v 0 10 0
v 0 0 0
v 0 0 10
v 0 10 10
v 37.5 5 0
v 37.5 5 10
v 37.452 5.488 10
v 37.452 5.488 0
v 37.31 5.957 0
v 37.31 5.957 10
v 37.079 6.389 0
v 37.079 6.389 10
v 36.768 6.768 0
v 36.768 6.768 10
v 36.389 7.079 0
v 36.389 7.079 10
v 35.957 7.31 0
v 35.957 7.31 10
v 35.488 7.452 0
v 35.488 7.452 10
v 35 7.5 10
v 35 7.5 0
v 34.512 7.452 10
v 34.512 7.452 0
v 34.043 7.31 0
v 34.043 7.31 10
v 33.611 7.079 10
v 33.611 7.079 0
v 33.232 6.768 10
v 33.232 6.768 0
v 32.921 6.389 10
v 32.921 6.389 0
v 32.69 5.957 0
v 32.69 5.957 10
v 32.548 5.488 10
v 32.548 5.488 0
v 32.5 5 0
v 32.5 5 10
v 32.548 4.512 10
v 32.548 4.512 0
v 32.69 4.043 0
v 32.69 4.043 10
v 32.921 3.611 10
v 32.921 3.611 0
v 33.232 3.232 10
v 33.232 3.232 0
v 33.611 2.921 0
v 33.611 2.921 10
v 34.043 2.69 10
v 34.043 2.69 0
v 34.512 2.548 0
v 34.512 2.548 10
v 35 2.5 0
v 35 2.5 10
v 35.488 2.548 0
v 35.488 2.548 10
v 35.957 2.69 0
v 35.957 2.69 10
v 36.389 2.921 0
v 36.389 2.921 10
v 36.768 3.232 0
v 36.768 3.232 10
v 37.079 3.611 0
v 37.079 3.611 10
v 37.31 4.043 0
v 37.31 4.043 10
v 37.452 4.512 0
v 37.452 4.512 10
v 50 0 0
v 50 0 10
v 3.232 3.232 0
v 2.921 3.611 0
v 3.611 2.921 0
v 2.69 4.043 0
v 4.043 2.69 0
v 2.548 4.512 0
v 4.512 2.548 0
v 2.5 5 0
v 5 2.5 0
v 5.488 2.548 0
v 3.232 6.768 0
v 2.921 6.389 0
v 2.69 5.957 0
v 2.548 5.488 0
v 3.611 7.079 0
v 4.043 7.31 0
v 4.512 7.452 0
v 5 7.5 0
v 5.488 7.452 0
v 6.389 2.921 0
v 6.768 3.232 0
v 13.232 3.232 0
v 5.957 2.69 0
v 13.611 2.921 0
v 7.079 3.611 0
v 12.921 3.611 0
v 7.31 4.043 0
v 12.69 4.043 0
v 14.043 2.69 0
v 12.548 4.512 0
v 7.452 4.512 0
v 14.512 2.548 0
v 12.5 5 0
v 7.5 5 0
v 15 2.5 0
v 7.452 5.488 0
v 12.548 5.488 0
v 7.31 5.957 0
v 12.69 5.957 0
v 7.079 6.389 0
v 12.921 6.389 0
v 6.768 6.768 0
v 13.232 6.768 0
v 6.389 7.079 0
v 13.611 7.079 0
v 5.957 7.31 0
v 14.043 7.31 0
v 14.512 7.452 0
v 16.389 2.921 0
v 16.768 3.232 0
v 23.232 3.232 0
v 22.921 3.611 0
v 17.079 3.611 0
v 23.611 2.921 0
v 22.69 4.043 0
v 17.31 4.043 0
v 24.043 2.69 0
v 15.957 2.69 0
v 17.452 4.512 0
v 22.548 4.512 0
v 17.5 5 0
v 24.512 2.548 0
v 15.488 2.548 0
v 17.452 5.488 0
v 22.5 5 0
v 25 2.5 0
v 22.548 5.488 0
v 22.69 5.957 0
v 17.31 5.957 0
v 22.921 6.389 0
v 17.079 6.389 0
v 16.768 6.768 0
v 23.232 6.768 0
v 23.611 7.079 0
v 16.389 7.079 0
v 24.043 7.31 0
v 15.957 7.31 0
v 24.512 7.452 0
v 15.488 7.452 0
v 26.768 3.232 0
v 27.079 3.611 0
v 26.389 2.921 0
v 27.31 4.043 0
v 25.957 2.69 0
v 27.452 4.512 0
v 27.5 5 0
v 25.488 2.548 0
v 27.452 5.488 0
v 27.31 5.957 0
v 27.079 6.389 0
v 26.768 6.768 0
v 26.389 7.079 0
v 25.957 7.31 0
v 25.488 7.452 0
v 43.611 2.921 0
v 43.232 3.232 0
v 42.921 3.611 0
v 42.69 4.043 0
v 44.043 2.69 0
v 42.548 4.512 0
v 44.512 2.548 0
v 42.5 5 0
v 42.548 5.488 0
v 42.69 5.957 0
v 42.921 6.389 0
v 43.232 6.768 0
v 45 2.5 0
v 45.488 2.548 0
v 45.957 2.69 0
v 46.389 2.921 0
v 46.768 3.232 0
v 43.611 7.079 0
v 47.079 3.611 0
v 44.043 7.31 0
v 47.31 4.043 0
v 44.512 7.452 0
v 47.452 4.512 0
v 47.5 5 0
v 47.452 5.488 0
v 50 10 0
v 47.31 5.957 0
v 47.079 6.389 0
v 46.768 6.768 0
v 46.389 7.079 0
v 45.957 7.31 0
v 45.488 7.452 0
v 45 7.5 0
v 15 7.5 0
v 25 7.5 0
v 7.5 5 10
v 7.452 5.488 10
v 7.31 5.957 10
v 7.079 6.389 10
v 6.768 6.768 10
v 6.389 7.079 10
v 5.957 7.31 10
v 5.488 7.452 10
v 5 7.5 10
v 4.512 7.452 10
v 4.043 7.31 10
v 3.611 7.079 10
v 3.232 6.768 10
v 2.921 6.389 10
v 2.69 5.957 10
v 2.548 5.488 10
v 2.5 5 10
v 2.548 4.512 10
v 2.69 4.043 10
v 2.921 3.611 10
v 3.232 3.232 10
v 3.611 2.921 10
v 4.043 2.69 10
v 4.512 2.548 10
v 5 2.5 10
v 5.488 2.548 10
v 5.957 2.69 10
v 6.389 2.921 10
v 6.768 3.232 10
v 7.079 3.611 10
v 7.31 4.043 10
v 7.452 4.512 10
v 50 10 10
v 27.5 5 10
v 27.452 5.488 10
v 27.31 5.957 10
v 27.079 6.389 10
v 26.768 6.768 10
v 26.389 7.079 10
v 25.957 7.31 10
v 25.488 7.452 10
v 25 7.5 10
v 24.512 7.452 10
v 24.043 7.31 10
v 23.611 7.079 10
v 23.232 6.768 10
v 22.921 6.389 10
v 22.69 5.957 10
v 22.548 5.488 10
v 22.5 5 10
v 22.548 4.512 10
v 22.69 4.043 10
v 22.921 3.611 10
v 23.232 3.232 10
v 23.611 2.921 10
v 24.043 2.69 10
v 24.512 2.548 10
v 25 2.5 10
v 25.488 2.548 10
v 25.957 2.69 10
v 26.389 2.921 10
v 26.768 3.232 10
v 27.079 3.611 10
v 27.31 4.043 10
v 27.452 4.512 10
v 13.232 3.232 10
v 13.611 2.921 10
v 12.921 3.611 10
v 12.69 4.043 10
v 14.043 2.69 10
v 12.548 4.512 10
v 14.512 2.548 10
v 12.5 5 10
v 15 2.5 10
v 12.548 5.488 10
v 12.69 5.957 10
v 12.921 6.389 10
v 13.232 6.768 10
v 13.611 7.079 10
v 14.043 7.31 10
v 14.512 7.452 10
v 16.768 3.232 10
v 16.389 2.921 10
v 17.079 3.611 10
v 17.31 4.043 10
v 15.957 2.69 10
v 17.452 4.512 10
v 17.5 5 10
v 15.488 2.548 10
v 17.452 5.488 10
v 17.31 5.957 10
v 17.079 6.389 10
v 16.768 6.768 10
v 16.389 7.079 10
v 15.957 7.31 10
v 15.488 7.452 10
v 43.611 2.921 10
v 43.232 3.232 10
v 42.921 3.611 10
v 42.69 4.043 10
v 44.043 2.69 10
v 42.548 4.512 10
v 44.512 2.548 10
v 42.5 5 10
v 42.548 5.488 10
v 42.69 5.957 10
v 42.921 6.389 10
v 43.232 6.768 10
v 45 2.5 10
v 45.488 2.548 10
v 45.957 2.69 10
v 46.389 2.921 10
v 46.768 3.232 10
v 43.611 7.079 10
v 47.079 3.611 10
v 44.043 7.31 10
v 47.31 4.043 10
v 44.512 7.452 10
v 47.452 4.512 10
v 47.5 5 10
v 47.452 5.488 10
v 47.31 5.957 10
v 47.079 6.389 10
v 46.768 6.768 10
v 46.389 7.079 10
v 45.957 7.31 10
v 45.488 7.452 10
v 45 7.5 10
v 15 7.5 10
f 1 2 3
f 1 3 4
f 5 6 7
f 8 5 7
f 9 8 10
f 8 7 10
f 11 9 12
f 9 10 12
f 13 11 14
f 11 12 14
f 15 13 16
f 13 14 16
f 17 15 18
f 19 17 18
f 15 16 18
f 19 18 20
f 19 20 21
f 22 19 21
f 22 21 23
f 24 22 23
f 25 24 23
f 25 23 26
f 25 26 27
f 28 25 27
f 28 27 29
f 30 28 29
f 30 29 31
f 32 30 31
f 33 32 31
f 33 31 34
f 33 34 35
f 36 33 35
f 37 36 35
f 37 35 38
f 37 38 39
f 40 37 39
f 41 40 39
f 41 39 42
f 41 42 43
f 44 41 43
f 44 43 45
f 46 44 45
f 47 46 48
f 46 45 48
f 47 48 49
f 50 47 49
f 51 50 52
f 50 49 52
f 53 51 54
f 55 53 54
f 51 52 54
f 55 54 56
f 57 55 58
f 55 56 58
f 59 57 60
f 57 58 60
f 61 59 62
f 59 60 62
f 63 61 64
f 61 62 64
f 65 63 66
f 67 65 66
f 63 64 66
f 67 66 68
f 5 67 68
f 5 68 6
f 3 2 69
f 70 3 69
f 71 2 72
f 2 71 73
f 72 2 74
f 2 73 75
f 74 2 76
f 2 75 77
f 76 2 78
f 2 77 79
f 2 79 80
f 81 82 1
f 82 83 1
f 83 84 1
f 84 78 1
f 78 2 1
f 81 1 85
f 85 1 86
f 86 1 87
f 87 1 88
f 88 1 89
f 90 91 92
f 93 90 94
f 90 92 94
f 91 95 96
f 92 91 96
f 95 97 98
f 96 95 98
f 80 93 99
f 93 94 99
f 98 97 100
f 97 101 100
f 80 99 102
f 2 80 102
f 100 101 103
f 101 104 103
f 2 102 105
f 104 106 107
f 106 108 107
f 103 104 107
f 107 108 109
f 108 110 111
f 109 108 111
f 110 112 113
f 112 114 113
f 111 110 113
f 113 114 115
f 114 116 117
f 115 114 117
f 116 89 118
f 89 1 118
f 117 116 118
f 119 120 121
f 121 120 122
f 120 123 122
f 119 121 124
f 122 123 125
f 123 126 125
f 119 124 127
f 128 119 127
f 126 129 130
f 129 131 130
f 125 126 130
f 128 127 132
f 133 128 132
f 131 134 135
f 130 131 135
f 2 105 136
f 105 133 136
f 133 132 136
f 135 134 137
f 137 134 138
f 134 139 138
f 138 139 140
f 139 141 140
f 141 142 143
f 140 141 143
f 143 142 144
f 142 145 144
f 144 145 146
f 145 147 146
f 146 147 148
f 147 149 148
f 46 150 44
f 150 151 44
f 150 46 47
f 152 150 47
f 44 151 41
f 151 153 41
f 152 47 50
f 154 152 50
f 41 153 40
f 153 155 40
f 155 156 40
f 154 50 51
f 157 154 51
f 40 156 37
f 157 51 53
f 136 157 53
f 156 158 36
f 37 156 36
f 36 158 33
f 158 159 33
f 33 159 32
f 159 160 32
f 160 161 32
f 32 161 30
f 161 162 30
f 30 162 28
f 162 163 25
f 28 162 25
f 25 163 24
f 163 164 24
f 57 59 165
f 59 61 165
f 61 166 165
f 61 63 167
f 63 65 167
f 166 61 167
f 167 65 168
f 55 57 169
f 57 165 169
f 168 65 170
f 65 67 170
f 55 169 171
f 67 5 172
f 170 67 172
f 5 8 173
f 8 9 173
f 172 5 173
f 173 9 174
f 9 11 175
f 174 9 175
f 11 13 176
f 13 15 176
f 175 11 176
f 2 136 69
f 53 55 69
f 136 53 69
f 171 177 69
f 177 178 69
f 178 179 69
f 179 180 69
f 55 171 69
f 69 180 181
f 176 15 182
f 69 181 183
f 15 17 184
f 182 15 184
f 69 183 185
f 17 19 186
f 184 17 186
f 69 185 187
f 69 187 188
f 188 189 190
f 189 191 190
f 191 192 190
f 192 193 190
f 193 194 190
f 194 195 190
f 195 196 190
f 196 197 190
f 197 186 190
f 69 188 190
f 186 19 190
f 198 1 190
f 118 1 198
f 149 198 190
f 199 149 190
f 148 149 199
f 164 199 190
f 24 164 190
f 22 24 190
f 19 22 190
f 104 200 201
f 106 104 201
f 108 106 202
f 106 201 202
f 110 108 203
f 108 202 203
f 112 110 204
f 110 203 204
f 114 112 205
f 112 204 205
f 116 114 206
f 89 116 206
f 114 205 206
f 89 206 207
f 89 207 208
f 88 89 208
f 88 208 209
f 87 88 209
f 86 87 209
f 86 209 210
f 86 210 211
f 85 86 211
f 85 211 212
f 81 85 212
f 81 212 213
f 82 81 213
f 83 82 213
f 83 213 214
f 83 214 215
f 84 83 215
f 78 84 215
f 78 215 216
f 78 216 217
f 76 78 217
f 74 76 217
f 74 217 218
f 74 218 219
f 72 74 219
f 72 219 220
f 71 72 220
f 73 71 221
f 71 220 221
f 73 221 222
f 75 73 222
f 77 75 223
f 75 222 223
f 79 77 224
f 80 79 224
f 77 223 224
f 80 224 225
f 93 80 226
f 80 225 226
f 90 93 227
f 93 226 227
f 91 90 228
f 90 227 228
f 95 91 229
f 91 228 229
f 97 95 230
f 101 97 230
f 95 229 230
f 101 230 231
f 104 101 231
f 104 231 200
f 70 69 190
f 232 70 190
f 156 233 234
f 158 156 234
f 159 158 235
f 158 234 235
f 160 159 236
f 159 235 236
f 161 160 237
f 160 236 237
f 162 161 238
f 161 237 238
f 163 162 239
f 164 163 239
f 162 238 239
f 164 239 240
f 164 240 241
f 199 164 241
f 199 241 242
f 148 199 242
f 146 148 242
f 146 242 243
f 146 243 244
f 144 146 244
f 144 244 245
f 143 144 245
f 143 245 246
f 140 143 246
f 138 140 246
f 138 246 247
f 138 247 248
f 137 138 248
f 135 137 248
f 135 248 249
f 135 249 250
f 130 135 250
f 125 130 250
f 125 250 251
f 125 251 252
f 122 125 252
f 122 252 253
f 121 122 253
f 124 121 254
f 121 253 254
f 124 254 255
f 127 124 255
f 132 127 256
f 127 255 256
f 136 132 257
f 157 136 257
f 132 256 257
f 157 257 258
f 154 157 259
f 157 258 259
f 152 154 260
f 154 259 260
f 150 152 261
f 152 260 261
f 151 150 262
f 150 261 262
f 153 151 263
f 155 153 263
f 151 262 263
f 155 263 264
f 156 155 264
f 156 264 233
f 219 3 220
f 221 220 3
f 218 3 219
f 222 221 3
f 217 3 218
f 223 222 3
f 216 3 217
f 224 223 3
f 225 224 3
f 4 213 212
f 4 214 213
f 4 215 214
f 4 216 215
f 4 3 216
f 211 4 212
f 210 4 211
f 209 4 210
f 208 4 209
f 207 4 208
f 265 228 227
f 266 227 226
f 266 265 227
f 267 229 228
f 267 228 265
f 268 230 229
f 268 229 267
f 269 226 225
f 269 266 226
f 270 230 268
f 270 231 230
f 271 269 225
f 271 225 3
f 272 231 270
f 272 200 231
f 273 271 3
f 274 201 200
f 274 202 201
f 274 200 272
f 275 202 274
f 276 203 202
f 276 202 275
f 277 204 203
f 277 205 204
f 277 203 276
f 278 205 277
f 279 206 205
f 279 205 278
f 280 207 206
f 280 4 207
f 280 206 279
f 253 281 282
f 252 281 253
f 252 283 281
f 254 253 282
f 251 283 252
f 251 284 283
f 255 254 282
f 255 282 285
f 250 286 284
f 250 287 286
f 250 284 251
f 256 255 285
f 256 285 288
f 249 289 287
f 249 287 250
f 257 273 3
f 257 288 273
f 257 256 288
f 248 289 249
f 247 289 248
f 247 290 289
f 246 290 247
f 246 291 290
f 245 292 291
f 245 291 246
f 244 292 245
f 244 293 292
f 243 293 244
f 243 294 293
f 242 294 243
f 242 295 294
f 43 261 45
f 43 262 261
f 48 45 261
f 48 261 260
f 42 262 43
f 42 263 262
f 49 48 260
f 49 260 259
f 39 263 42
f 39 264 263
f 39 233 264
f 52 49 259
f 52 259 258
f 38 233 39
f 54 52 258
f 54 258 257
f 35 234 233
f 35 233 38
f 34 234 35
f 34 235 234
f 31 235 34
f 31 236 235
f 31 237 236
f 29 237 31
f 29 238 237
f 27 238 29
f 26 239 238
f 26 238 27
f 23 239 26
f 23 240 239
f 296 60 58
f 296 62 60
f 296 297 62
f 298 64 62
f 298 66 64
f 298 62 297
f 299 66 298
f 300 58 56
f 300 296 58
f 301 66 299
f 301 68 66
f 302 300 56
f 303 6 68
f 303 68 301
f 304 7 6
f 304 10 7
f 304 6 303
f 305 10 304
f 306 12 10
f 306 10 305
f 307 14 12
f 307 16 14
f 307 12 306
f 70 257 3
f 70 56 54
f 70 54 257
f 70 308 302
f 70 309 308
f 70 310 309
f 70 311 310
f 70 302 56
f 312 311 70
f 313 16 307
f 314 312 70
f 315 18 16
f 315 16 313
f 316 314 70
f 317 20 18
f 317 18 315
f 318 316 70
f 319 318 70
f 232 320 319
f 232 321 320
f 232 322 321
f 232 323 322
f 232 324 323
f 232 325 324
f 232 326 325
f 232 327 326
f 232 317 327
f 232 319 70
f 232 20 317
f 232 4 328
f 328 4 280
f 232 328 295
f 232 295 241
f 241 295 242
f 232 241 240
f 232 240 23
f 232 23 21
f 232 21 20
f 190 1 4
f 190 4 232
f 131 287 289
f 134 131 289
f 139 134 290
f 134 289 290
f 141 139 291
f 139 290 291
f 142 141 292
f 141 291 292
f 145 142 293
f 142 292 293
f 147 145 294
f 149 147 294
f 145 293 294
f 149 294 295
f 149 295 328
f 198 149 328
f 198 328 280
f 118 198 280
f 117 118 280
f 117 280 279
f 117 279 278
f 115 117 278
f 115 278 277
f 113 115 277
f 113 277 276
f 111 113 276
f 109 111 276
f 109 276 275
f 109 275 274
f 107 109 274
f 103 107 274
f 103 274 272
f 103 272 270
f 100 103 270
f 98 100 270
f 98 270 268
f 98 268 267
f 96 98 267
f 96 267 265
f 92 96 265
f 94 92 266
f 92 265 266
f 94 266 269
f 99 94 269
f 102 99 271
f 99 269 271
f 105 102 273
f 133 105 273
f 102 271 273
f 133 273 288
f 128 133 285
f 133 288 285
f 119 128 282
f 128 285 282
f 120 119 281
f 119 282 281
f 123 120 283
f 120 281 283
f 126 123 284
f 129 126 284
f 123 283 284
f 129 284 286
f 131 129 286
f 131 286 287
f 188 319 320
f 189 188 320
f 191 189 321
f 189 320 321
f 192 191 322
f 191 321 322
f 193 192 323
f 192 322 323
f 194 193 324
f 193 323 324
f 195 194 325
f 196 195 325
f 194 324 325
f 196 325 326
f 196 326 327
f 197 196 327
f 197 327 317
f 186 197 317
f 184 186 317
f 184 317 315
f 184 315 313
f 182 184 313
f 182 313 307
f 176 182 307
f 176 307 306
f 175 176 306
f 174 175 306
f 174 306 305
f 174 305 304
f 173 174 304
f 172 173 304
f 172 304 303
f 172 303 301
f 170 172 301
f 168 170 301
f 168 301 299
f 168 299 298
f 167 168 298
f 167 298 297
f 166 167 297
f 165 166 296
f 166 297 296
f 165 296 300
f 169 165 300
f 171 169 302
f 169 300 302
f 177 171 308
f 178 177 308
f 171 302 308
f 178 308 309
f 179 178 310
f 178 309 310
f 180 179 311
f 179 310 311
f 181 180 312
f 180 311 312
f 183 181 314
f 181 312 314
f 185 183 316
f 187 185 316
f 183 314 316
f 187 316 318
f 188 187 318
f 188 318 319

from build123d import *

# Parameters (mm, degrees)
ESQUISSE1_W             = 50
ESQUISSE1_H             = 10
BOSS_EXTRU_1_DEPTH      = 10
ENL_V_MAT_EXTRU_1_REACH = 53.962
ESQUISSE2_R             = 2.5


with BuildPart() as part:
    # Esquisse1 → Boss.-Extru.1 (new body)
    with BuildSketch(Plane.XY):
        with Locations((25, 5)):
            Rectangle(ESQUISSE1_W, ESQUISSE1_H)
    extrude(amount=BOSS_EXTRU_1_DEPTH)

    # Esquisse2 → Enlèv. mat.-Extru.1 (cut, up to next)
    with BuildSketch(Plane.XY.offset(10), mode=Mode.PRIVATE) as enl_v_mat_extru_1_sk1:
        with Locations((5, 5)):
            Circle(ESQUISSE2_R)
    enl_v_mat_extru_1_tool1 = extrude(enl_v_mat_extru_1_sk1.sketch, amount=-ENL_V_MAT_EXTRU_1_REACH, mode=Mode.PRIVATE) & part.part
    # Esquisse2 → Enlèv. mat.-Extru.1 (cut, up to next)
    with BuildSketch(Plane.XY.offset(10), mode=Mode.PRIVATE) as enl_v_mat_extru_1_sk2:
        with Locations((15, 5)):
            Circle(ESQUISSE2_R)
    enl_v_mat_extru_1_tool2 = extrude(enl_v_mat_extru_1_sk2.sketch, amount=-ENL_V_MAT_EXTRU_1_REACH, mode=Mode.PRIVATE) & part.part
    # Esquisse2 → Enlèv. mat.-Extru.1 (cut, up to next)
    with BuildSketch(Plane.XY.offset(10), mode=Mode.PRIVATE) as enl_v_mat_extru_1_sk3:
        with Locations((25, 5)):
            Circle(ESQUISSE2_R)
    enl_v_mat_extru_1_tool3 = extrude(enl_v_mat_extru_1_sk3.sketch, amount=-ENL_V_MAT_EXTRU_1_REACH, mode=Mode.PRIVATE) & part.part
    # Esquisse2 → Enlèv. mat.-Extru.1 (cut, up to next)
    with BuildSketch(Plane.XY.offset(10), mode=Mode.PRIVATE) as enl_v_mat_extru_1_sk4:
        with Locations((35, 5)):
            Circle(ESQUISSE2_R)
    enl_v_mat_extru_1_tool4 = extrude(enl_v_mat_extru_1_sk4.sketch, amount=-ENL_V_MAT_EXTRU_1_REACH, mode=Mode.PRIVATE) & part.part
    # Esquisse2 → Enlèv. mat.-Extru.1 (cut, up to next)
    with BuildSketch(Plane.XY.offset(10), mode=Mode.PRIVATE) as enl_v_mat_extru_1_sk5:
        with Locations((45, 5)):
            Circle(ESQUISSE2_R)
    enl_v_mat_extru_1_tool5 = extrude(enl_v_mat_extru_1_sk5.sketch, amount=-ENL_V_MAT_EXTRU_1_REACH, mode=Mode.PRIVATE) & part.part
    add(enl_v_mat_extru_1_tool1.solids().sort_by_distance((5, 5, 10))[0], mode=Mode.SUBTRACT)
    add(enl_v_mat_extru_1_tool2.solids().sort_by_distance((15, 5, 10))[0], mode=Mode.SUBTRACT)
    add(enl_v_mat_extru_1_tool3.solids().sort_by_distance((25, 5, 10))[0], mode=Mode.SUBTRACT)
    add(enl_v_mat_extru_1_tool4.solids().sort_by_distance((35, 5, 10))[0], mode=Mode.SUBTRACT)
    add(enl_v_mat_extru_1_tool5.solids().sort_by_distance((45, 5, 10))[0], mode=Mode.SUBTRACT)


solid = part.part
